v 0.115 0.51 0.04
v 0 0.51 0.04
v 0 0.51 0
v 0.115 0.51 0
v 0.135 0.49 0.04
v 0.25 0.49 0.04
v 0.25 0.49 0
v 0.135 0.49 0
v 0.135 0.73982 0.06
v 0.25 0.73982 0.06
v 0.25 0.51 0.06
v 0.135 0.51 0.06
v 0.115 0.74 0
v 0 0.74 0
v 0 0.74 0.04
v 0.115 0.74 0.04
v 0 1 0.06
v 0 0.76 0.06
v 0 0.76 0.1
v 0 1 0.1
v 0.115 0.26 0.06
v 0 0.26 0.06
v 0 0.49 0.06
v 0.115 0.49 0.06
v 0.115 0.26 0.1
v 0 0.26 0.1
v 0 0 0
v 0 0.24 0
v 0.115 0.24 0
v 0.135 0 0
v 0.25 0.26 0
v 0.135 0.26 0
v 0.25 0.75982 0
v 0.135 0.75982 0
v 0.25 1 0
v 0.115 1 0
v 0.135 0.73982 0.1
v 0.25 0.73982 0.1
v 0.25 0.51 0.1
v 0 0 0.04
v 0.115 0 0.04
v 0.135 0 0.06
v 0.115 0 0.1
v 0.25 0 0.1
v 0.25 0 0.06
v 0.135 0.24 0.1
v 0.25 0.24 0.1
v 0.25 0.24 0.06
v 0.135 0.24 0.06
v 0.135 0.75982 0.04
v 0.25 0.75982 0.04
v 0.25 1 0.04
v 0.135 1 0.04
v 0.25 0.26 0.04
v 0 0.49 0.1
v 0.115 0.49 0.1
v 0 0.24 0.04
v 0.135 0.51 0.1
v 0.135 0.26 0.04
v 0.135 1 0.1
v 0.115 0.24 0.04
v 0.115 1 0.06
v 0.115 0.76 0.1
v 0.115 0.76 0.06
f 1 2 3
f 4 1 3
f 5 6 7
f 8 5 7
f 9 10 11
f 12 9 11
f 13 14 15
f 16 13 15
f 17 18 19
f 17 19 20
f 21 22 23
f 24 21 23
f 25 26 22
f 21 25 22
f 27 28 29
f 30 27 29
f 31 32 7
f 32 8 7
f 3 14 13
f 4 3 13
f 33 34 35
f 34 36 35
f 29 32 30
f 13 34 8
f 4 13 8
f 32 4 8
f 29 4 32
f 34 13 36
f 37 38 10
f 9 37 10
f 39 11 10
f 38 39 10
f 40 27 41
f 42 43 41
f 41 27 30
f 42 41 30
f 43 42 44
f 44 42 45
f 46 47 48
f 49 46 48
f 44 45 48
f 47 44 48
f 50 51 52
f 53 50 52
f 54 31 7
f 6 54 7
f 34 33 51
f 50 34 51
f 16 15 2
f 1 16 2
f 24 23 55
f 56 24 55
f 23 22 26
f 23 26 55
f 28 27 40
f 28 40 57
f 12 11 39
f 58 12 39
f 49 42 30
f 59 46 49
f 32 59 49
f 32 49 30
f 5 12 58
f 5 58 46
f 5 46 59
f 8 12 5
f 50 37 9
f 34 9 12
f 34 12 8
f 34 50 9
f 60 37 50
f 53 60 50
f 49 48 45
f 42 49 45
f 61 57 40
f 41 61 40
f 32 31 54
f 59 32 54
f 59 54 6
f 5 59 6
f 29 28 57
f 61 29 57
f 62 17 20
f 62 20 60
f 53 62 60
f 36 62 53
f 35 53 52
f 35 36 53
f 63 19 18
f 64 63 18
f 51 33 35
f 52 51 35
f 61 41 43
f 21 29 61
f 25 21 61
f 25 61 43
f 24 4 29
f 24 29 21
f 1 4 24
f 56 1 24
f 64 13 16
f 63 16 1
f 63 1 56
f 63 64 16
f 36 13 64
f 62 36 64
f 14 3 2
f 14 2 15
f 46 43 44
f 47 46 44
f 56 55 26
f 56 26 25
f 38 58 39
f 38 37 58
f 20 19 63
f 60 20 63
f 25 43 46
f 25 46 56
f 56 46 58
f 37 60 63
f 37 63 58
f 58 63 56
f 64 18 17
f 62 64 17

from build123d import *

# Parameters (mm, degrees)
SKETCH1_W           = 0.25
SKETCH1_H           = 1
BOSS_EXTRUDE1_DEPTH = 0.1
CUT_EXTRUDE1_DEPTH  = 0.115
CUT_EXTRUDE2_DEPTH  = 0.115


with BuildPart() as part:
    # Sketch1 → Boss-Extrude1 (new body)
    with BuildSketch(Plane.XY):
        with Locations((0.125, 0.5)):
            Rectangle(SKETCH1_W, SKETCH1_H)
    extrude(amount=BOSS_EXTRUDE1_DEPTH)

    # Sketch2 → Cut-Extrude1 (cut)
    with BuildSketch(Plane.ZY):
        Polygon((0.04, 0), (0.1, 0), (0.1, 0.26), (0.06, 0.26), (0.06, 0.49), (0.1, 0.49), (0.1, 0.76), (0.06, 0.76), (0.06, 1), (0, 1), (0, 0.74), (0.04, 0.74), (0.04, 0.51), (0, 0.51), (0, 0.24), (0.04, 0.24), align=None)
    extrude(amount=-CUT_EXTRUDE1_DEPTH, mode=Mode.SUBTRACT)

    # Sketch3 → Cut-Extrude2 (cut)
    with BuildSketch(Plane(origin=(0.25, 0, 0), x_dir=(0, 0, -1), z_dir=(1, 0, 0))):
        Polygon((-0.04, 1), (-0.1, 1), (-0.1, 0.739819694), (-0.06, 0.739819694), (-0.06, 0.51), (-0.1, 0.51), (-0.1, 0.24), (-0.06, 0.24), (-0.06, 0), (0, 0), (0, 0.26), (-0.04, 0.26), (-0.04, 0.49), (0, 0.49), (0, 0.759819694), (-0.04, 0.759819694), align=None)
    extrude(amount=-CUT_EXTRUDE2_DEPTH, mode=Mode.SUBTRACT)


solid = part.part
